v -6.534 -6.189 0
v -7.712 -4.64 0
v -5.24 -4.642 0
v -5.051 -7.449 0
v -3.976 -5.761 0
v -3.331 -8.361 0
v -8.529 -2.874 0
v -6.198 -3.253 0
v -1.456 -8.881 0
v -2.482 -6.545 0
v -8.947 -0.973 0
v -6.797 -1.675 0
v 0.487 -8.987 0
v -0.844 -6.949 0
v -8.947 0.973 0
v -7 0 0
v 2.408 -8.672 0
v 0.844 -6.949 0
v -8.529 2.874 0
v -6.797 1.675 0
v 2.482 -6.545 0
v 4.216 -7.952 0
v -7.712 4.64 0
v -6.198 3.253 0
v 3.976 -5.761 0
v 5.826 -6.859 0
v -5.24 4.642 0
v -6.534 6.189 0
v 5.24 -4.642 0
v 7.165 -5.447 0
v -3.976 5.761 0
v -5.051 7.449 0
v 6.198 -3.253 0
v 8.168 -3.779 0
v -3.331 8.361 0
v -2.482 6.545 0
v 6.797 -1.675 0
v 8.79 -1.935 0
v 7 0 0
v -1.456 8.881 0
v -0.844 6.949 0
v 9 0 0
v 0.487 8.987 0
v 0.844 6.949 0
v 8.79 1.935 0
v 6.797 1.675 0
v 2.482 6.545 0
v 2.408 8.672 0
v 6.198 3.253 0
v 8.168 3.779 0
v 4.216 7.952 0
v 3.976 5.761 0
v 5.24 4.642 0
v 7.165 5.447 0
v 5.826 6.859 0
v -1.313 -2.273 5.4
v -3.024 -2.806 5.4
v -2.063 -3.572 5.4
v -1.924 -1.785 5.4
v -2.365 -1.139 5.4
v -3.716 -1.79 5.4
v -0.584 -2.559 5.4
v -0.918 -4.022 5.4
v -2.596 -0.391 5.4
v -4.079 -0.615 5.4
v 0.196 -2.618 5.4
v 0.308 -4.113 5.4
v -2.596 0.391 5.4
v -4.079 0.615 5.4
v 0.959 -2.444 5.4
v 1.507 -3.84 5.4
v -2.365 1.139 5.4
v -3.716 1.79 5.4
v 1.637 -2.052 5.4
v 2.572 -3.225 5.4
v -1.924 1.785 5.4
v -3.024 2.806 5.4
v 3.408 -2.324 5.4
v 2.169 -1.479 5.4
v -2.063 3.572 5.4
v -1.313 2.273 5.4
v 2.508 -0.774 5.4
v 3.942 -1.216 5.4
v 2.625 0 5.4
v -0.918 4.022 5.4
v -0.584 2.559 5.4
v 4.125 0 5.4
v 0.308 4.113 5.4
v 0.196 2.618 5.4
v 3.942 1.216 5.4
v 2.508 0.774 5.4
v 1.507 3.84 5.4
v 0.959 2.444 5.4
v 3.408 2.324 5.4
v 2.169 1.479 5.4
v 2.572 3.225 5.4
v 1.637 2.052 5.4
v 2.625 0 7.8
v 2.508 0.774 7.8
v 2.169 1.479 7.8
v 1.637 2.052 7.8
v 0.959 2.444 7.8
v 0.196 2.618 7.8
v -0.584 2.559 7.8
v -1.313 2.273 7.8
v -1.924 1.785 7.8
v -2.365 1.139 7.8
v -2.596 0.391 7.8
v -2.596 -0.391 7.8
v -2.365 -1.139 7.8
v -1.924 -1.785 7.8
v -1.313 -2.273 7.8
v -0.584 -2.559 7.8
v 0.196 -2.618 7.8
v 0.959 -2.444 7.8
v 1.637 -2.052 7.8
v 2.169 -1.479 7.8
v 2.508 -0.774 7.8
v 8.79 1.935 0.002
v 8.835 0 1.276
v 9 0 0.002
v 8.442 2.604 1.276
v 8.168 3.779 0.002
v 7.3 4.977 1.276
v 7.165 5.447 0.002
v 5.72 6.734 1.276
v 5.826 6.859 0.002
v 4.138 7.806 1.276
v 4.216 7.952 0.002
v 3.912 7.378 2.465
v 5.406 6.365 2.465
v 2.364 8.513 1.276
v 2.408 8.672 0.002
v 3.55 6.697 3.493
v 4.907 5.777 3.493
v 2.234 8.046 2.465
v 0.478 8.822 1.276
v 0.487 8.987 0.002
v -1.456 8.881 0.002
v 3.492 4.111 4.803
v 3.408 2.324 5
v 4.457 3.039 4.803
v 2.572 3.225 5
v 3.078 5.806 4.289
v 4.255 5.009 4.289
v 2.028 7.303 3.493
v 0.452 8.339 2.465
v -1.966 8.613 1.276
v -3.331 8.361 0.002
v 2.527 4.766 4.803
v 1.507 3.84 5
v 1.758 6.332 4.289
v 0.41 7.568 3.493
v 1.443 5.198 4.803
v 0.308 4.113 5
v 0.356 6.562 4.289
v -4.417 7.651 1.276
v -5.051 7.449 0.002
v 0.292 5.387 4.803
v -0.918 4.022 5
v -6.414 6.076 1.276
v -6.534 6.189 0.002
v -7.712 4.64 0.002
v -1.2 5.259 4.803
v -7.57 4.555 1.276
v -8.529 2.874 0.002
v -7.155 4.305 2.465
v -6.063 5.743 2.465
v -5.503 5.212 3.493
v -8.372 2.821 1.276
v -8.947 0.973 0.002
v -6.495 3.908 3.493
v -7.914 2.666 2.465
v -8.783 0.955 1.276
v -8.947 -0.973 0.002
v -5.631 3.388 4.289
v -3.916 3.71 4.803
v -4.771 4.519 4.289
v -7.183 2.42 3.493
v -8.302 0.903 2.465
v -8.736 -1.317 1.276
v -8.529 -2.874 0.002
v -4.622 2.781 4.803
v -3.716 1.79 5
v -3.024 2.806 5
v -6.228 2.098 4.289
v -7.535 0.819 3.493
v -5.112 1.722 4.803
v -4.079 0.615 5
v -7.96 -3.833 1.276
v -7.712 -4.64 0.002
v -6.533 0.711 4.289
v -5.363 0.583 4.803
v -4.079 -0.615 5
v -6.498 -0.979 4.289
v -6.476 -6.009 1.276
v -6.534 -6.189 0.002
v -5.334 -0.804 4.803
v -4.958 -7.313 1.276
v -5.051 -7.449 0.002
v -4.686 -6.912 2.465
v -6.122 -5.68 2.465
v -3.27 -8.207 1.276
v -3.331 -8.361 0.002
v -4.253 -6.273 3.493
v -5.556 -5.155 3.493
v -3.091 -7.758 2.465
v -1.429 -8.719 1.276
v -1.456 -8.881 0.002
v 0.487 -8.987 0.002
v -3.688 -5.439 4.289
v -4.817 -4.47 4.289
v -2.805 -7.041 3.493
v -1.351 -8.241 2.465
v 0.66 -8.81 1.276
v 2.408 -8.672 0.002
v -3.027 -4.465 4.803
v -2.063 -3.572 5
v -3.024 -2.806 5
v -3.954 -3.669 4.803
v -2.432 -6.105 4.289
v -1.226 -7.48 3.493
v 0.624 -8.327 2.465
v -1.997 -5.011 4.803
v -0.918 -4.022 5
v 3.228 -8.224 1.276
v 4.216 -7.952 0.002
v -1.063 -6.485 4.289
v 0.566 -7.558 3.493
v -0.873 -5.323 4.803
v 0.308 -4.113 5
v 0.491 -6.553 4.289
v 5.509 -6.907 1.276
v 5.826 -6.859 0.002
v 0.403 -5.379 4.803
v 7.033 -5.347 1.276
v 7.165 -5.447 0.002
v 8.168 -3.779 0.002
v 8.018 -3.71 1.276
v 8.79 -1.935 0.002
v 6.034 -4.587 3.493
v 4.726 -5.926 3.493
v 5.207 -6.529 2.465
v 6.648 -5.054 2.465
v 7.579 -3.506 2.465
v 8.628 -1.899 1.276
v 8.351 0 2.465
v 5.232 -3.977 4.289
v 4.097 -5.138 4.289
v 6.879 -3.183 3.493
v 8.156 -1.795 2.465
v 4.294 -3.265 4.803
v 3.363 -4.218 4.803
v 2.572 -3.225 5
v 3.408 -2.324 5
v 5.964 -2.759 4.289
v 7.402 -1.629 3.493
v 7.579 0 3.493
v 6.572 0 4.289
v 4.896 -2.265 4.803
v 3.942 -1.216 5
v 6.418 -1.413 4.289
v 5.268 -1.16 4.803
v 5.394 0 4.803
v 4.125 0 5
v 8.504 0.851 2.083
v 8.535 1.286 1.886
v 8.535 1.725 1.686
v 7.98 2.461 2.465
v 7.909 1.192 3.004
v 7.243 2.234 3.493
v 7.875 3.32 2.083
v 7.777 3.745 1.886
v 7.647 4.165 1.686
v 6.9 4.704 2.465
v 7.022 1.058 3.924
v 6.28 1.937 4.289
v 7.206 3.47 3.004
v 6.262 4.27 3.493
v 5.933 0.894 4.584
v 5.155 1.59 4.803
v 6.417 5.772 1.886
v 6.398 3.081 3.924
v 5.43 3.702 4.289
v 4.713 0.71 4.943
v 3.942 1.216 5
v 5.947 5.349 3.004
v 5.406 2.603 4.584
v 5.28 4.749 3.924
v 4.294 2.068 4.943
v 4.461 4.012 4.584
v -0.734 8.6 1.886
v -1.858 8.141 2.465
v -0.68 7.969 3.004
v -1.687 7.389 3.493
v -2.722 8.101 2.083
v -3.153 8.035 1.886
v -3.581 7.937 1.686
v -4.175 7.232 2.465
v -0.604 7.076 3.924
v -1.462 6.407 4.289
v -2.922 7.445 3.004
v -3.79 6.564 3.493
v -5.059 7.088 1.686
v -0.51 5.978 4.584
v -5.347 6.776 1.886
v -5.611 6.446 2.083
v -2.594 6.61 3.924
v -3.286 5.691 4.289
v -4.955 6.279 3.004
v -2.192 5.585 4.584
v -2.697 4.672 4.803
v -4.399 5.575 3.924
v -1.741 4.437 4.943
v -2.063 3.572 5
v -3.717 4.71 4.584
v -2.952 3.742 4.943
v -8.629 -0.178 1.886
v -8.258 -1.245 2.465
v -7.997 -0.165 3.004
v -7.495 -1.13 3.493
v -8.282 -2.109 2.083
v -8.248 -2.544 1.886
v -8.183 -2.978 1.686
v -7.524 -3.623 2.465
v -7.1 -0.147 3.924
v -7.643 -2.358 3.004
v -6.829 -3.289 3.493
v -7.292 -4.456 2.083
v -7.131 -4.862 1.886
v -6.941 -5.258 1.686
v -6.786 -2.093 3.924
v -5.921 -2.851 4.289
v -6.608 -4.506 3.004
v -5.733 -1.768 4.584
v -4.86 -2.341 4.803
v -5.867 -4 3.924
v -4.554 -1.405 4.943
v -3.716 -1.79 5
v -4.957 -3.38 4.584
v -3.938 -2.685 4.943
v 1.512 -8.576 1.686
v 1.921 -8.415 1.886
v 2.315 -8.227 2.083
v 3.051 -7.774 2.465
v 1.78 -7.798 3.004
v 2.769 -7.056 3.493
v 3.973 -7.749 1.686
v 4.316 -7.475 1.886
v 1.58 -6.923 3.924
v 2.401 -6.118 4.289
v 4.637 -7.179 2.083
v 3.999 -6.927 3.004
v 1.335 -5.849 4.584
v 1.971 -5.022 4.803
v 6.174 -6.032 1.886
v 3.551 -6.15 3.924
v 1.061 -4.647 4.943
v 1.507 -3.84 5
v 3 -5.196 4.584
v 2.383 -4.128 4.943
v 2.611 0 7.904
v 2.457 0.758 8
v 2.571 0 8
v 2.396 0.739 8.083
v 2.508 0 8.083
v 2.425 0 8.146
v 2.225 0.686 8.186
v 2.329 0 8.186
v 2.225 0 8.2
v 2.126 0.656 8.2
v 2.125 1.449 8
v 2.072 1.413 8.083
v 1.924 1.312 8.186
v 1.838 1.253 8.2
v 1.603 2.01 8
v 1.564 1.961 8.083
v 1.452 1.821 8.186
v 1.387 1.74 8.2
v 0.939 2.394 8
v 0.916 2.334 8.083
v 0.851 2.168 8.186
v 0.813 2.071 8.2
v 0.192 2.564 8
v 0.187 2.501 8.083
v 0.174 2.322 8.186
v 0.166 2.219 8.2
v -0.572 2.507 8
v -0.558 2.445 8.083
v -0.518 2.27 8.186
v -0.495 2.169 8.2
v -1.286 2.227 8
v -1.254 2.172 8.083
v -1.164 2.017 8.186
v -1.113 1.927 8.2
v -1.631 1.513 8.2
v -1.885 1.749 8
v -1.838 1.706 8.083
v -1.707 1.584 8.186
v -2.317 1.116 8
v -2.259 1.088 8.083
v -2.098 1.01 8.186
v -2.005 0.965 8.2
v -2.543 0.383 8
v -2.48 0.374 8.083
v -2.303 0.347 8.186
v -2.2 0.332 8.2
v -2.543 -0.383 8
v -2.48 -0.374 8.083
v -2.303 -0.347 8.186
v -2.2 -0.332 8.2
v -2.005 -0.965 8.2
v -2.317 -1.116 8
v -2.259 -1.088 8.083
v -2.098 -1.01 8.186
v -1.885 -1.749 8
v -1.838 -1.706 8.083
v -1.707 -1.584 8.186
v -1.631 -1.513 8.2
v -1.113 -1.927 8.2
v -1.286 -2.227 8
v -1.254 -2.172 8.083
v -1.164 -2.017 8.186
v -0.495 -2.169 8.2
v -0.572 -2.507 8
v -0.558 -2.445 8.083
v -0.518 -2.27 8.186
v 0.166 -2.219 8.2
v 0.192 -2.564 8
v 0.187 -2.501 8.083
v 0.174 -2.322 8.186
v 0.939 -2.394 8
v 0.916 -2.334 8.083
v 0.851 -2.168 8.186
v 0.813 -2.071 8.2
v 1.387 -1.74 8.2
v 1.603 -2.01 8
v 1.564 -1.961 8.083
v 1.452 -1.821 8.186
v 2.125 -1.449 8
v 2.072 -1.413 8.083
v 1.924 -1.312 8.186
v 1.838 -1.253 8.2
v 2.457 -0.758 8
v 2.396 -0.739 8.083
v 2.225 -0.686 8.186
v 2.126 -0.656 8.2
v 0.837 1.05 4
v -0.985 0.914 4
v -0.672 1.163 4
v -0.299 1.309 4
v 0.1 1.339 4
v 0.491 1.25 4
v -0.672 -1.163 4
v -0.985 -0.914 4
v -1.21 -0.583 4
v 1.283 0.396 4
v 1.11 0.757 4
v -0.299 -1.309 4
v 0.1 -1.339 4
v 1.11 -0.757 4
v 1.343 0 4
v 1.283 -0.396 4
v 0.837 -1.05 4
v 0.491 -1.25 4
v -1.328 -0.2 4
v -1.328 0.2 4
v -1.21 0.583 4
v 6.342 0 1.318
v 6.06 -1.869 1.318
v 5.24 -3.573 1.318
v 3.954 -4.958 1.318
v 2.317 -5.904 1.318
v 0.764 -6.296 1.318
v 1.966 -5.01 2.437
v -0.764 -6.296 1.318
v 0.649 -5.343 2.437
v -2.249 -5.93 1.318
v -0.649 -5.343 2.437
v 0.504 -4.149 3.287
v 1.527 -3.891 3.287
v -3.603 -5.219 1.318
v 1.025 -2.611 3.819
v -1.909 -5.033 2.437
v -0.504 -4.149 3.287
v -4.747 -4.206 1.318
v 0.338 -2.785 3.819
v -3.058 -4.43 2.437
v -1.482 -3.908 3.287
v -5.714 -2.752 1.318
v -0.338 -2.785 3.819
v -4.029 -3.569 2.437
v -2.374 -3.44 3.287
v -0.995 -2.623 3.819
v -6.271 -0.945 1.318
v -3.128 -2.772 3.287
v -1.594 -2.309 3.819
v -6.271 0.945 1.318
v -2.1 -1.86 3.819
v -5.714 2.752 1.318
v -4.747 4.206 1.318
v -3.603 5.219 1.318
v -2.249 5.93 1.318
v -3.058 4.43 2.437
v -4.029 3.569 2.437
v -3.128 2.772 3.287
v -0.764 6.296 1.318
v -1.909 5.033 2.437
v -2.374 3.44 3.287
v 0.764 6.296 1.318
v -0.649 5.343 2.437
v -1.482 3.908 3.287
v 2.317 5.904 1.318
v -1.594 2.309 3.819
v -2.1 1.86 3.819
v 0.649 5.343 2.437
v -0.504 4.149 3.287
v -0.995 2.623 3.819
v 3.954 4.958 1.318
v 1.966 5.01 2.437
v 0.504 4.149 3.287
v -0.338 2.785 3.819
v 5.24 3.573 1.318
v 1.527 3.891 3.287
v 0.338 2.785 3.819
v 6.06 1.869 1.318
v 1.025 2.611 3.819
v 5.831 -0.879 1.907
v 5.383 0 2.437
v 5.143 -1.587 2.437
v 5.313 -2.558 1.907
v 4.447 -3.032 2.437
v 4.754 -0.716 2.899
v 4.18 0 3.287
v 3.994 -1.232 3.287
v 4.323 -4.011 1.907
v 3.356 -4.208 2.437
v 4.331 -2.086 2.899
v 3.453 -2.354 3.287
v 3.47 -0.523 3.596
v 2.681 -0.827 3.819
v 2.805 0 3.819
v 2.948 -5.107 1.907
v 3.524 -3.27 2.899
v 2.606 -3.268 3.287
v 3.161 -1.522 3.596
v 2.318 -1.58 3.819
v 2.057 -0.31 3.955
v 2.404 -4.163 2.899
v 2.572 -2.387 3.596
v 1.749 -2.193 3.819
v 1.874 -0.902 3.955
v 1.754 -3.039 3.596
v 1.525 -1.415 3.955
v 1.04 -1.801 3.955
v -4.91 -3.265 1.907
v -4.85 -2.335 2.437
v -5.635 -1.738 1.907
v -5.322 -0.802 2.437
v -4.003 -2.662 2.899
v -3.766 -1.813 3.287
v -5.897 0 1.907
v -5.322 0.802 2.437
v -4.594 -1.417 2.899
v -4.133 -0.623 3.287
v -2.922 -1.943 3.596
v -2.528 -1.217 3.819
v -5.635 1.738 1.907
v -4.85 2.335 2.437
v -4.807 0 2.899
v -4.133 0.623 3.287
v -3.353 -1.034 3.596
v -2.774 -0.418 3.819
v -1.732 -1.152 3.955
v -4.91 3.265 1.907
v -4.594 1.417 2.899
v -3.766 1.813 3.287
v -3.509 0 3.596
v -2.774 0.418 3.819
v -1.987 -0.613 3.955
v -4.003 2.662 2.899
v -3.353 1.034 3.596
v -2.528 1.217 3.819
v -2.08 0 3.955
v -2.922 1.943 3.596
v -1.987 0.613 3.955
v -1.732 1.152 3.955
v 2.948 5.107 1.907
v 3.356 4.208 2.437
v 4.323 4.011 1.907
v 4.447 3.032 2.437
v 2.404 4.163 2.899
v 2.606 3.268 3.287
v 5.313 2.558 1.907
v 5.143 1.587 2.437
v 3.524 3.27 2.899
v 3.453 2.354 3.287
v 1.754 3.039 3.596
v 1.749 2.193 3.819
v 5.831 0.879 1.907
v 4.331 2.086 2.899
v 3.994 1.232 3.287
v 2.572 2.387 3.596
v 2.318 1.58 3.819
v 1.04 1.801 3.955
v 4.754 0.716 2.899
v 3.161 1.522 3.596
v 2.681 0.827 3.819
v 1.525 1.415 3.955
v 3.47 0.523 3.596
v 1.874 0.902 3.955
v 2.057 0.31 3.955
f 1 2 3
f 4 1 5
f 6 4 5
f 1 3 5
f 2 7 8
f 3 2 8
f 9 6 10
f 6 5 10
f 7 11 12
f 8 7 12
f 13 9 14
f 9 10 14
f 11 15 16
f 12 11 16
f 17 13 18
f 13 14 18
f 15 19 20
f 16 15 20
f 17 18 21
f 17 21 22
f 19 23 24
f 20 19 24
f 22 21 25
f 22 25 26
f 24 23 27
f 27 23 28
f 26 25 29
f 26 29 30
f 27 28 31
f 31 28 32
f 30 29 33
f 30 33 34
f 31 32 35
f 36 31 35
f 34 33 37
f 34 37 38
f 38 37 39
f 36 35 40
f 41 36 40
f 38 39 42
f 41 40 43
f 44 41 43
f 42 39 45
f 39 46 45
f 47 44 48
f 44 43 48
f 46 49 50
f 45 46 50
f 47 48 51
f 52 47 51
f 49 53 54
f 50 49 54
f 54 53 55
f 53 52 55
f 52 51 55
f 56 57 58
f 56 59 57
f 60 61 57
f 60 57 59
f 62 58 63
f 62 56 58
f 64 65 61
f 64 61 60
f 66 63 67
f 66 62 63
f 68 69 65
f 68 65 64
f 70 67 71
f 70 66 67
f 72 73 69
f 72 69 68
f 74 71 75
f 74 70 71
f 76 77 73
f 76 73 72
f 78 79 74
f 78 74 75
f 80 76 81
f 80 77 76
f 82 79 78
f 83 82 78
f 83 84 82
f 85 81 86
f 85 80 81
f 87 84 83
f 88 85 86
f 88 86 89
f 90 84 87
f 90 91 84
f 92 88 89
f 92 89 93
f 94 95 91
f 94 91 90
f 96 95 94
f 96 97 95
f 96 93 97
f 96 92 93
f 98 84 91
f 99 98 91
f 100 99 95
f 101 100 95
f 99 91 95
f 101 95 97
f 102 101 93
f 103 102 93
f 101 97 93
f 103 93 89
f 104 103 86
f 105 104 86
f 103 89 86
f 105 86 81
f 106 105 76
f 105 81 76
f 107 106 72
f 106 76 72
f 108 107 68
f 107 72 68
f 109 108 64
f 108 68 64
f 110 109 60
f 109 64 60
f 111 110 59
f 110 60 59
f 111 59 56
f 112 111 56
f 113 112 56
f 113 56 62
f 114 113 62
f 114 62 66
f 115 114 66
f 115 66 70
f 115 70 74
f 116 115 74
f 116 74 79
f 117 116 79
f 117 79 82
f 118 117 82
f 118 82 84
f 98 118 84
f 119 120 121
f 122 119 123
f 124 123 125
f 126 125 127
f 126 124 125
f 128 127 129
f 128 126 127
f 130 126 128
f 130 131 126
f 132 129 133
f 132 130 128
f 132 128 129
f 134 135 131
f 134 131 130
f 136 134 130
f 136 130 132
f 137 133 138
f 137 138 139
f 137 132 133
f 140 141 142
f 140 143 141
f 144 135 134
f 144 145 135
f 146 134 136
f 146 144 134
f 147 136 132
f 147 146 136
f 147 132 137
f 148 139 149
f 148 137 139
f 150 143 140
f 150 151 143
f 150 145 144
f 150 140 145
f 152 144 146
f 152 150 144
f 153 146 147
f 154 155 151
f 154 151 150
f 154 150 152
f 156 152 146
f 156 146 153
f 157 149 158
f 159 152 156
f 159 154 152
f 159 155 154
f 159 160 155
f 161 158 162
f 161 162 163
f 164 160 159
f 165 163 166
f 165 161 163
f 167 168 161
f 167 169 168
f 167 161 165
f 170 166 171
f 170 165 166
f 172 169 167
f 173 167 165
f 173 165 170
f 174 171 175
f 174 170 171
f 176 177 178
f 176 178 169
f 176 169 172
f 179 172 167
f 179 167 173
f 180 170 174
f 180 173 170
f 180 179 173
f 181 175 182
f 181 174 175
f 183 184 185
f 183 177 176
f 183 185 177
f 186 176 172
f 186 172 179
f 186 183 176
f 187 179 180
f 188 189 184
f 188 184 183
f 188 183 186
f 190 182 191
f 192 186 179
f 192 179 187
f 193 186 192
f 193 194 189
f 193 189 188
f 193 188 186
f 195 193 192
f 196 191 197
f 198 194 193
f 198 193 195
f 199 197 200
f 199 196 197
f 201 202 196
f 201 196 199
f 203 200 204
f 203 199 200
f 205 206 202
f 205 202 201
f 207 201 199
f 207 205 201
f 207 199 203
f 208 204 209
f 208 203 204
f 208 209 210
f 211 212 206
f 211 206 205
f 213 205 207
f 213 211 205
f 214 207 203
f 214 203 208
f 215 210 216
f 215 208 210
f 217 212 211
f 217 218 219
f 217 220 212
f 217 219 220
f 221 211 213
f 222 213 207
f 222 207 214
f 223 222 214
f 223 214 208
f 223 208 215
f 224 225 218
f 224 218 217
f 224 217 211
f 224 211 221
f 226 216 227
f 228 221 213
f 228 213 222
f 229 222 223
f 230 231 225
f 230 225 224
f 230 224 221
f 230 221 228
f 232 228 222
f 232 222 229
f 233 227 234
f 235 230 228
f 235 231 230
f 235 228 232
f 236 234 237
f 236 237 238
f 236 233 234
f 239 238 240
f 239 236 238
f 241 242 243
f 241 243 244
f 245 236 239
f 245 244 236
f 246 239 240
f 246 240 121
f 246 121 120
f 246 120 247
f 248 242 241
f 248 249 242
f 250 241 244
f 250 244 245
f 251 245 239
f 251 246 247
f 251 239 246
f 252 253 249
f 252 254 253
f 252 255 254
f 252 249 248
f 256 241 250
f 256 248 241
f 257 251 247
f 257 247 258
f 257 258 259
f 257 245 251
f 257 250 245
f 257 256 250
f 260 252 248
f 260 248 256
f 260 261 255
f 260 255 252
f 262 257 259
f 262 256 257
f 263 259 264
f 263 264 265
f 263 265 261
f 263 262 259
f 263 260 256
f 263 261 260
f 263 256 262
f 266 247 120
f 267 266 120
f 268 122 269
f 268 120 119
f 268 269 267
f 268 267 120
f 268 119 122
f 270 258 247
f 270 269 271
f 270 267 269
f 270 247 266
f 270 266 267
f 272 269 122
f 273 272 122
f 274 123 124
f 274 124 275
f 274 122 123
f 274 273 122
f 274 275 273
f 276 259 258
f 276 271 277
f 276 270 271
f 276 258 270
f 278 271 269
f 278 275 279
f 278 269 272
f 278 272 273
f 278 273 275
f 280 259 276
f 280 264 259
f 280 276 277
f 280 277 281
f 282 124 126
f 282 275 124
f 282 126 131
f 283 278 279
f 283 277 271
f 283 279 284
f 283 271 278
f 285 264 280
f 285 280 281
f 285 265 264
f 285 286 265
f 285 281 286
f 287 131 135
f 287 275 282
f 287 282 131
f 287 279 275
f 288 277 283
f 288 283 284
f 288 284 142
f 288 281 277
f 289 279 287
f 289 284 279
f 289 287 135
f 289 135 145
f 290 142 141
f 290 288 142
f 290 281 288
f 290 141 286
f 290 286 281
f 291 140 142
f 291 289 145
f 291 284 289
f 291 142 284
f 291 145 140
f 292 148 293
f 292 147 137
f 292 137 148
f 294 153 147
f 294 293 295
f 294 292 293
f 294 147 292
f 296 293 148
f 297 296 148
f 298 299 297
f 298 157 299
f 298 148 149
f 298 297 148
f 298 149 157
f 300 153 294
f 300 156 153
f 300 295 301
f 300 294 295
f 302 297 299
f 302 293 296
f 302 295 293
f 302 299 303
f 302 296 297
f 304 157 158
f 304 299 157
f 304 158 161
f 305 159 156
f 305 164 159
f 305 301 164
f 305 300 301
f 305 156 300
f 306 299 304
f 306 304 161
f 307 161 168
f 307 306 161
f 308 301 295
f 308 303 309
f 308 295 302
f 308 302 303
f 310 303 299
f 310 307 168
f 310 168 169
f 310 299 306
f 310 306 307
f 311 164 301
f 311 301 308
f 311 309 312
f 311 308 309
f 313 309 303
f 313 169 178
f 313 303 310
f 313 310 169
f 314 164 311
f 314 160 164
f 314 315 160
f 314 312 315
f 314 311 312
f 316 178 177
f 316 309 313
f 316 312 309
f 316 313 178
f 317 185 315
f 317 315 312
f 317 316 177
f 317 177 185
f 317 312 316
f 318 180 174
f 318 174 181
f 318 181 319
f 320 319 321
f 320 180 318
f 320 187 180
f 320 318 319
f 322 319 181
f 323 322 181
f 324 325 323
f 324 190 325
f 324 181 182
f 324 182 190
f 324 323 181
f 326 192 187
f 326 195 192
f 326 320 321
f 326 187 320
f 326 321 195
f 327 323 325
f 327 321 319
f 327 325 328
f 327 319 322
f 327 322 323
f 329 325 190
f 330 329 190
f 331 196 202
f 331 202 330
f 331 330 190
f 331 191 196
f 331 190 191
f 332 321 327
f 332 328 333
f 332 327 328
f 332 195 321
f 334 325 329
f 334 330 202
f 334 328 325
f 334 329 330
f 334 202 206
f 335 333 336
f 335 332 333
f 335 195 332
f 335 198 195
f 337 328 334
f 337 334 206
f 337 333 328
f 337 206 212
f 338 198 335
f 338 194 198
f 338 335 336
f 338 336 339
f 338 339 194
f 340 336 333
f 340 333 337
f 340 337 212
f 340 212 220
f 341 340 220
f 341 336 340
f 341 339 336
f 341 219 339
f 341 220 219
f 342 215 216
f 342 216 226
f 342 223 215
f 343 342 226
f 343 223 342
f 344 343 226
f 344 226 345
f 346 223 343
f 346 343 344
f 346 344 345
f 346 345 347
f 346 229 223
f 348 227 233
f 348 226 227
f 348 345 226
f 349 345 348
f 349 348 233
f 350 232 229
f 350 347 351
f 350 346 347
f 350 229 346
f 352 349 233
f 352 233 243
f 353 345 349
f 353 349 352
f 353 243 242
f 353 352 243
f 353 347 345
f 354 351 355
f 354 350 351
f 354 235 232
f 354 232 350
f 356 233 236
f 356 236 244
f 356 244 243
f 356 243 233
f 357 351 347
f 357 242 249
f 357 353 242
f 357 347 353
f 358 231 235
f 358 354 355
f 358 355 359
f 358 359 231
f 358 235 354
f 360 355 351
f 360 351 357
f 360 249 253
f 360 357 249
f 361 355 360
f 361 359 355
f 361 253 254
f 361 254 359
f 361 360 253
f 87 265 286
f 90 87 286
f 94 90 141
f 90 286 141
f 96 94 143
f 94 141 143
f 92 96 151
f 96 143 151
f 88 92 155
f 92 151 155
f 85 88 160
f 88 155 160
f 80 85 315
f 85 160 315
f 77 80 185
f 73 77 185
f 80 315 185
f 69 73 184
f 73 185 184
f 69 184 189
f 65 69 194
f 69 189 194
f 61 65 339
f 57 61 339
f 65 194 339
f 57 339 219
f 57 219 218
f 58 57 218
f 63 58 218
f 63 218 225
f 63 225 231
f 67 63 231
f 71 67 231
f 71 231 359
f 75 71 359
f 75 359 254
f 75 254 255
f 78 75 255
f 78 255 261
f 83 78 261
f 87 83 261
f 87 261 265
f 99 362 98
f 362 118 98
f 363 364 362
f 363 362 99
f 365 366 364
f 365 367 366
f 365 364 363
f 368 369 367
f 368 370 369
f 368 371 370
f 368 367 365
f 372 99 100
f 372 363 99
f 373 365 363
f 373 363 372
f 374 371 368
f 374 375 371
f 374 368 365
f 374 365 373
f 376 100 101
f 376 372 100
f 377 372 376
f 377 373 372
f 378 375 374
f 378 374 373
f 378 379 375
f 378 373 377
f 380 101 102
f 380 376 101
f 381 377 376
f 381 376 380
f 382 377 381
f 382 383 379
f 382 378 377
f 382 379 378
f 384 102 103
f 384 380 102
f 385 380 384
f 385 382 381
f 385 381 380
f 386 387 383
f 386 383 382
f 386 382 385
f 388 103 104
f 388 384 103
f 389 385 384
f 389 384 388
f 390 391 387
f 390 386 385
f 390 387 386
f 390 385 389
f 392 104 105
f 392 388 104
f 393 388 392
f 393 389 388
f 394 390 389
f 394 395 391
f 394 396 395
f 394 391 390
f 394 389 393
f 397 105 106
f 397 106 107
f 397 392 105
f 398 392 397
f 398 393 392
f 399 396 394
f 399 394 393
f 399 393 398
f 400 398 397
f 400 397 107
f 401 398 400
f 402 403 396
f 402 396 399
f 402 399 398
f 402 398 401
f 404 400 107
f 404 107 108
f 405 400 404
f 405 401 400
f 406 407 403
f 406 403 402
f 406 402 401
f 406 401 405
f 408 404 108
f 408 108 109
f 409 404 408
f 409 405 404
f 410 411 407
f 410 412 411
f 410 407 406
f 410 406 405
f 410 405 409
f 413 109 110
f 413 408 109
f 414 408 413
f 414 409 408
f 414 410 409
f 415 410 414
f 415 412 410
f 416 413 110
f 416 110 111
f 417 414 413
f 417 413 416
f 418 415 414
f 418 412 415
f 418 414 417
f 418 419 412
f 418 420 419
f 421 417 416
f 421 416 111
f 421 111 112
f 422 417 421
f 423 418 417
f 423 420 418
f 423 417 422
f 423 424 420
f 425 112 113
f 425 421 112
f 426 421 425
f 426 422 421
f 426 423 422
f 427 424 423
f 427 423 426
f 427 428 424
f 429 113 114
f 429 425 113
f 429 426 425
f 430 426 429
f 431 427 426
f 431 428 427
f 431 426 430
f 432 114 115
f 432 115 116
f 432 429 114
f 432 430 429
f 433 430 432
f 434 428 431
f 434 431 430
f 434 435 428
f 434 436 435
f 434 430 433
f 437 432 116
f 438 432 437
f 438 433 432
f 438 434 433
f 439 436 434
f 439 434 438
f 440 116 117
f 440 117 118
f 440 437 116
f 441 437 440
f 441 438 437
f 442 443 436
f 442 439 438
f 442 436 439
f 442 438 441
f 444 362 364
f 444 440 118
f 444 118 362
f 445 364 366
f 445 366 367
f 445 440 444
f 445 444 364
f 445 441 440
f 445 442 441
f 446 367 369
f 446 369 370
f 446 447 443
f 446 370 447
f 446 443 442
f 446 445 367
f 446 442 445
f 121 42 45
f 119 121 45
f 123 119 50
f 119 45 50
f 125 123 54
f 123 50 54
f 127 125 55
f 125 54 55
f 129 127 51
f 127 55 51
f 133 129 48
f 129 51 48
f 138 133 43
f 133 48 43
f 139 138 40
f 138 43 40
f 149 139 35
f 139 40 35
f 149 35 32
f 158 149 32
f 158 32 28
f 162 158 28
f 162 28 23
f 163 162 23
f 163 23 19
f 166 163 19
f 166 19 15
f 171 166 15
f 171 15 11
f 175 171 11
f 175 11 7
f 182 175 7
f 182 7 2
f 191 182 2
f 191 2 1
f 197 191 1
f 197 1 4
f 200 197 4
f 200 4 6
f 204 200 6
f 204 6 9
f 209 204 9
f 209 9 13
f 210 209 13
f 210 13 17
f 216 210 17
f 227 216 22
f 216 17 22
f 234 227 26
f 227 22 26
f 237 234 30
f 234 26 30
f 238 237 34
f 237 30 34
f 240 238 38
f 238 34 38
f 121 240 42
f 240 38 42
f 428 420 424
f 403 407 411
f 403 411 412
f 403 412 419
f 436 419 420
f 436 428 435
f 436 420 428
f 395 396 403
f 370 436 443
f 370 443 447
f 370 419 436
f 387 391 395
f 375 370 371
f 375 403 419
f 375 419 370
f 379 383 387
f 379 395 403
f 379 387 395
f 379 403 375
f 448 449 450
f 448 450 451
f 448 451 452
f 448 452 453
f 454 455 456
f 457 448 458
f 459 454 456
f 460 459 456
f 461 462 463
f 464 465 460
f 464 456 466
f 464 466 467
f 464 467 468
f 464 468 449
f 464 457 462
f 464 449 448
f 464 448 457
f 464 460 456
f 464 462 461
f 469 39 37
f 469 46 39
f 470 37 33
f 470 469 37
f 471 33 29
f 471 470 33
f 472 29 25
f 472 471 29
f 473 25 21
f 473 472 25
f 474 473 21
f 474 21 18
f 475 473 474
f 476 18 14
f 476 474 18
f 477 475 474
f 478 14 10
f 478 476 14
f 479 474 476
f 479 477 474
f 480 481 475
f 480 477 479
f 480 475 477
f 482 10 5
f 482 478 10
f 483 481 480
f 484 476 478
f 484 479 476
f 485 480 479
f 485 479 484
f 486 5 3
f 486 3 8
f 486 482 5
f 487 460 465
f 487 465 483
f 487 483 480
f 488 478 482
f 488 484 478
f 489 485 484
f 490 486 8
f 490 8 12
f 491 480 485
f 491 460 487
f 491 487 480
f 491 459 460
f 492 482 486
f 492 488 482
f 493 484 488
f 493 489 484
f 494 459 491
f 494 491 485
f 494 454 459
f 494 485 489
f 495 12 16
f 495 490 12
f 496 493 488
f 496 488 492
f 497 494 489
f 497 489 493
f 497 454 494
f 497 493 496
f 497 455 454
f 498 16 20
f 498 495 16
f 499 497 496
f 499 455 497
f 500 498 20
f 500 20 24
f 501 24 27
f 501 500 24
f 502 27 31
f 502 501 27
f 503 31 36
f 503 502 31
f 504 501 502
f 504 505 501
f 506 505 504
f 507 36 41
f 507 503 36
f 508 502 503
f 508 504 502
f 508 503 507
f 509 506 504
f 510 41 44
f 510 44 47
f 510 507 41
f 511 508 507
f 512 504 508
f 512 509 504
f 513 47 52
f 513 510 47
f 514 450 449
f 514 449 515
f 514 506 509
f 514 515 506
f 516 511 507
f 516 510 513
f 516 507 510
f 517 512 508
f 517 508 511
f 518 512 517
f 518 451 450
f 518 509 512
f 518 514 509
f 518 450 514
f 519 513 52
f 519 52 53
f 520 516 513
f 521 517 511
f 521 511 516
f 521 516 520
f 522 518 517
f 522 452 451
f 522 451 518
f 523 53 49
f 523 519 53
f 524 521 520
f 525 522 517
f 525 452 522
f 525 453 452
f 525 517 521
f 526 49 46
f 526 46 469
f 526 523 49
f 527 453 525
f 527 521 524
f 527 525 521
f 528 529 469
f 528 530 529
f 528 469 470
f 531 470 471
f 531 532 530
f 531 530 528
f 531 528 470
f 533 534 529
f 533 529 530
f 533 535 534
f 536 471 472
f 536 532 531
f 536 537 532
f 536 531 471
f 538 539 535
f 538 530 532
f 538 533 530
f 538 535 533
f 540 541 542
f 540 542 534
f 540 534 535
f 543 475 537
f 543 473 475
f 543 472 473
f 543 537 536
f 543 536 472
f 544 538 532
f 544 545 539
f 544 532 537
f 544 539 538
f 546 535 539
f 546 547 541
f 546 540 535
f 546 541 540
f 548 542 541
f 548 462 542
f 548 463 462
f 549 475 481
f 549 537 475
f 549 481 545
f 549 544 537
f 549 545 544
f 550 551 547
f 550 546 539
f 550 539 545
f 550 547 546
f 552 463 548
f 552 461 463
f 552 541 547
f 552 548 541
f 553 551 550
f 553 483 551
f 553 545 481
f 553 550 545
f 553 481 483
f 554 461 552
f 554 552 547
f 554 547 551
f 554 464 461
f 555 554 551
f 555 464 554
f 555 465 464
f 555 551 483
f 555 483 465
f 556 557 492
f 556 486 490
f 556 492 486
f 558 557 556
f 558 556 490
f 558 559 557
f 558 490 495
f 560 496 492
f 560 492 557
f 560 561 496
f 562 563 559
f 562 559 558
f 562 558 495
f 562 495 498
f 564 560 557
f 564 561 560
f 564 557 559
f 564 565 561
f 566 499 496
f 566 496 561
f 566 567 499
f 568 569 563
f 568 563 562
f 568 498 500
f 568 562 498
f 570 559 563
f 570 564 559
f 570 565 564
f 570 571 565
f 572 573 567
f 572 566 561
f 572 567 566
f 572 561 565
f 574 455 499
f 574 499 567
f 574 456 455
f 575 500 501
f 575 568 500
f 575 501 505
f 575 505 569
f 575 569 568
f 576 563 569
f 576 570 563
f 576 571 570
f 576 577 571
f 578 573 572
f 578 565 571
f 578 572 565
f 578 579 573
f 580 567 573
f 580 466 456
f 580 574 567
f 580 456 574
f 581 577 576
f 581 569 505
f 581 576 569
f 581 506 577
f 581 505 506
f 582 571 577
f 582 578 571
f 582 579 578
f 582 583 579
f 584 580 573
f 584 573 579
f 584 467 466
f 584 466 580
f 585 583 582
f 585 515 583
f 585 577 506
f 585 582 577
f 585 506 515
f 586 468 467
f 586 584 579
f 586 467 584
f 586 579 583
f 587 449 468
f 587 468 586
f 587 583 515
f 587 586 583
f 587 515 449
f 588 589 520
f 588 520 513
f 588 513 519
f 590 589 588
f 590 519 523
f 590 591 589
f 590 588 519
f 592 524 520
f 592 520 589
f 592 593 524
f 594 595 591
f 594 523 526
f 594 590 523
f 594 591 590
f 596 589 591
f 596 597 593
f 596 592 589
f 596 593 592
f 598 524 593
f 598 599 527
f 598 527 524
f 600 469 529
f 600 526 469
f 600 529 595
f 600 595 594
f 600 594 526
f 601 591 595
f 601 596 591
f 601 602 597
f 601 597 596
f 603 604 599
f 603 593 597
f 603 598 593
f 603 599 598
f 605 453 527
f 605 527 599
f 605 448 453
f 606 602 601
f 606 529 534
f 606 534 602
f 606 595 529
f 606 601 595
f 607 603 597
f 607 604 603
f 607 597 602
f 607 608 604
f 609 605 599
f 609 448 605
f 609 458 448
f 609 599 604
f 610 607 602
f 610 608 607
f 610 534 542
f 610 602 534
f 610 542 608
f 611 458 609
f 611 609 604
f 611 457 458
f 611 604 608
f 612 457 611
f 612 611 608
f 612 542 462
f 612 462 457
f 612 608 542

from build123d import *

# Parameters (mm, degrees)
F0_R     = 9
F0_R_2   = 4.125
F1_DEPTH = 5
F0_R_3   = 2.625
F2_DEPTH = 5.4
F3_DEPTH = 8.2
F4_R     = 7
F5_DEPTH = 4
F8_R     = 0.4


# Not quite as in the source:
# - a fillet or chamfer that OpenCascade refuses, or shapes differently, is made with other operations: its cross-section is extruded or revolved along the edge and cut away or added


with BuildPart() as f1:
    # F0 (on Top) → F1 (new body)
    with BuildSketch(Plane.XY):
        Circle(F0_R)
        Circle(F0_R_2, mode=Mode.SUBTRACT)
    extrude(amount=F1_DEPTH)

    # F0 (on Top) → F2 (join)
    with BuildSketch(Plane.XY):
        Circle(F0_R_2)
        Circle(F0_R_3, mode=Mode.SUBTRACT)
    extrude(amount=F2_DEPTH)

    # F0 (on Top) → F3 (join)
    with BuildSketch(Plane.XY):
        Circle(F0_R_3)
    extrude(amount=F3_DEPTH)

    # F4 (on face) → F5 (cut)
    with BuildSketch(Plane(origin=(0, 0, 0), x_dir=(1, 0, 0), z_dir=(0, 0, -1))):
        Circle(F4_R)
    extrude(amount=-F5_DEPTH, mode=Mode.SUBTRACT)

    # F6: fillet of radius 6 on 1 edges, made by hand

    # F6_s1 → F6_t2 (revolve)
    with BuildSketch(Plane.XZ):
        with BuildLine():
            ThreePointArc((7, 0), (4.8072473656, 2.8989794856), (1.3431457505, 4))
            Line((1.3431457505, 4), (7, 4))
            Line((7, 4), (7, 0))
        make_face()
    revolve(axis=Axis((0, 0, 4), (0, 0, -1)))

    # F7: fillet of radius 5 on 1 edges, made by hand

    # F7_s1 → F7_t2 (revolve, cut)
    with BuildSketch(Plane.XZ):
        with BuildLine():
            ThreePointArc((9, 0.0015627442), (7.5794552658, 3.4926227552), (4.125, 5))
            Line((4.125, 5), (9, 5))
            Line((9, 5), (9, 0.0015627442))
        make_face()
    revolve(axis=Axis((0, 0, 5), (0, 0, 1)), mode=Mode.SUBTRACT)

    # F8
    f8_edges = [f1.edges().sort_by_distance(p)[0] for p in [
        (-2.625, 0, 8.2),
    ]]
    fillet(f8_edges, radius=F8_R)


solid = f1.part
